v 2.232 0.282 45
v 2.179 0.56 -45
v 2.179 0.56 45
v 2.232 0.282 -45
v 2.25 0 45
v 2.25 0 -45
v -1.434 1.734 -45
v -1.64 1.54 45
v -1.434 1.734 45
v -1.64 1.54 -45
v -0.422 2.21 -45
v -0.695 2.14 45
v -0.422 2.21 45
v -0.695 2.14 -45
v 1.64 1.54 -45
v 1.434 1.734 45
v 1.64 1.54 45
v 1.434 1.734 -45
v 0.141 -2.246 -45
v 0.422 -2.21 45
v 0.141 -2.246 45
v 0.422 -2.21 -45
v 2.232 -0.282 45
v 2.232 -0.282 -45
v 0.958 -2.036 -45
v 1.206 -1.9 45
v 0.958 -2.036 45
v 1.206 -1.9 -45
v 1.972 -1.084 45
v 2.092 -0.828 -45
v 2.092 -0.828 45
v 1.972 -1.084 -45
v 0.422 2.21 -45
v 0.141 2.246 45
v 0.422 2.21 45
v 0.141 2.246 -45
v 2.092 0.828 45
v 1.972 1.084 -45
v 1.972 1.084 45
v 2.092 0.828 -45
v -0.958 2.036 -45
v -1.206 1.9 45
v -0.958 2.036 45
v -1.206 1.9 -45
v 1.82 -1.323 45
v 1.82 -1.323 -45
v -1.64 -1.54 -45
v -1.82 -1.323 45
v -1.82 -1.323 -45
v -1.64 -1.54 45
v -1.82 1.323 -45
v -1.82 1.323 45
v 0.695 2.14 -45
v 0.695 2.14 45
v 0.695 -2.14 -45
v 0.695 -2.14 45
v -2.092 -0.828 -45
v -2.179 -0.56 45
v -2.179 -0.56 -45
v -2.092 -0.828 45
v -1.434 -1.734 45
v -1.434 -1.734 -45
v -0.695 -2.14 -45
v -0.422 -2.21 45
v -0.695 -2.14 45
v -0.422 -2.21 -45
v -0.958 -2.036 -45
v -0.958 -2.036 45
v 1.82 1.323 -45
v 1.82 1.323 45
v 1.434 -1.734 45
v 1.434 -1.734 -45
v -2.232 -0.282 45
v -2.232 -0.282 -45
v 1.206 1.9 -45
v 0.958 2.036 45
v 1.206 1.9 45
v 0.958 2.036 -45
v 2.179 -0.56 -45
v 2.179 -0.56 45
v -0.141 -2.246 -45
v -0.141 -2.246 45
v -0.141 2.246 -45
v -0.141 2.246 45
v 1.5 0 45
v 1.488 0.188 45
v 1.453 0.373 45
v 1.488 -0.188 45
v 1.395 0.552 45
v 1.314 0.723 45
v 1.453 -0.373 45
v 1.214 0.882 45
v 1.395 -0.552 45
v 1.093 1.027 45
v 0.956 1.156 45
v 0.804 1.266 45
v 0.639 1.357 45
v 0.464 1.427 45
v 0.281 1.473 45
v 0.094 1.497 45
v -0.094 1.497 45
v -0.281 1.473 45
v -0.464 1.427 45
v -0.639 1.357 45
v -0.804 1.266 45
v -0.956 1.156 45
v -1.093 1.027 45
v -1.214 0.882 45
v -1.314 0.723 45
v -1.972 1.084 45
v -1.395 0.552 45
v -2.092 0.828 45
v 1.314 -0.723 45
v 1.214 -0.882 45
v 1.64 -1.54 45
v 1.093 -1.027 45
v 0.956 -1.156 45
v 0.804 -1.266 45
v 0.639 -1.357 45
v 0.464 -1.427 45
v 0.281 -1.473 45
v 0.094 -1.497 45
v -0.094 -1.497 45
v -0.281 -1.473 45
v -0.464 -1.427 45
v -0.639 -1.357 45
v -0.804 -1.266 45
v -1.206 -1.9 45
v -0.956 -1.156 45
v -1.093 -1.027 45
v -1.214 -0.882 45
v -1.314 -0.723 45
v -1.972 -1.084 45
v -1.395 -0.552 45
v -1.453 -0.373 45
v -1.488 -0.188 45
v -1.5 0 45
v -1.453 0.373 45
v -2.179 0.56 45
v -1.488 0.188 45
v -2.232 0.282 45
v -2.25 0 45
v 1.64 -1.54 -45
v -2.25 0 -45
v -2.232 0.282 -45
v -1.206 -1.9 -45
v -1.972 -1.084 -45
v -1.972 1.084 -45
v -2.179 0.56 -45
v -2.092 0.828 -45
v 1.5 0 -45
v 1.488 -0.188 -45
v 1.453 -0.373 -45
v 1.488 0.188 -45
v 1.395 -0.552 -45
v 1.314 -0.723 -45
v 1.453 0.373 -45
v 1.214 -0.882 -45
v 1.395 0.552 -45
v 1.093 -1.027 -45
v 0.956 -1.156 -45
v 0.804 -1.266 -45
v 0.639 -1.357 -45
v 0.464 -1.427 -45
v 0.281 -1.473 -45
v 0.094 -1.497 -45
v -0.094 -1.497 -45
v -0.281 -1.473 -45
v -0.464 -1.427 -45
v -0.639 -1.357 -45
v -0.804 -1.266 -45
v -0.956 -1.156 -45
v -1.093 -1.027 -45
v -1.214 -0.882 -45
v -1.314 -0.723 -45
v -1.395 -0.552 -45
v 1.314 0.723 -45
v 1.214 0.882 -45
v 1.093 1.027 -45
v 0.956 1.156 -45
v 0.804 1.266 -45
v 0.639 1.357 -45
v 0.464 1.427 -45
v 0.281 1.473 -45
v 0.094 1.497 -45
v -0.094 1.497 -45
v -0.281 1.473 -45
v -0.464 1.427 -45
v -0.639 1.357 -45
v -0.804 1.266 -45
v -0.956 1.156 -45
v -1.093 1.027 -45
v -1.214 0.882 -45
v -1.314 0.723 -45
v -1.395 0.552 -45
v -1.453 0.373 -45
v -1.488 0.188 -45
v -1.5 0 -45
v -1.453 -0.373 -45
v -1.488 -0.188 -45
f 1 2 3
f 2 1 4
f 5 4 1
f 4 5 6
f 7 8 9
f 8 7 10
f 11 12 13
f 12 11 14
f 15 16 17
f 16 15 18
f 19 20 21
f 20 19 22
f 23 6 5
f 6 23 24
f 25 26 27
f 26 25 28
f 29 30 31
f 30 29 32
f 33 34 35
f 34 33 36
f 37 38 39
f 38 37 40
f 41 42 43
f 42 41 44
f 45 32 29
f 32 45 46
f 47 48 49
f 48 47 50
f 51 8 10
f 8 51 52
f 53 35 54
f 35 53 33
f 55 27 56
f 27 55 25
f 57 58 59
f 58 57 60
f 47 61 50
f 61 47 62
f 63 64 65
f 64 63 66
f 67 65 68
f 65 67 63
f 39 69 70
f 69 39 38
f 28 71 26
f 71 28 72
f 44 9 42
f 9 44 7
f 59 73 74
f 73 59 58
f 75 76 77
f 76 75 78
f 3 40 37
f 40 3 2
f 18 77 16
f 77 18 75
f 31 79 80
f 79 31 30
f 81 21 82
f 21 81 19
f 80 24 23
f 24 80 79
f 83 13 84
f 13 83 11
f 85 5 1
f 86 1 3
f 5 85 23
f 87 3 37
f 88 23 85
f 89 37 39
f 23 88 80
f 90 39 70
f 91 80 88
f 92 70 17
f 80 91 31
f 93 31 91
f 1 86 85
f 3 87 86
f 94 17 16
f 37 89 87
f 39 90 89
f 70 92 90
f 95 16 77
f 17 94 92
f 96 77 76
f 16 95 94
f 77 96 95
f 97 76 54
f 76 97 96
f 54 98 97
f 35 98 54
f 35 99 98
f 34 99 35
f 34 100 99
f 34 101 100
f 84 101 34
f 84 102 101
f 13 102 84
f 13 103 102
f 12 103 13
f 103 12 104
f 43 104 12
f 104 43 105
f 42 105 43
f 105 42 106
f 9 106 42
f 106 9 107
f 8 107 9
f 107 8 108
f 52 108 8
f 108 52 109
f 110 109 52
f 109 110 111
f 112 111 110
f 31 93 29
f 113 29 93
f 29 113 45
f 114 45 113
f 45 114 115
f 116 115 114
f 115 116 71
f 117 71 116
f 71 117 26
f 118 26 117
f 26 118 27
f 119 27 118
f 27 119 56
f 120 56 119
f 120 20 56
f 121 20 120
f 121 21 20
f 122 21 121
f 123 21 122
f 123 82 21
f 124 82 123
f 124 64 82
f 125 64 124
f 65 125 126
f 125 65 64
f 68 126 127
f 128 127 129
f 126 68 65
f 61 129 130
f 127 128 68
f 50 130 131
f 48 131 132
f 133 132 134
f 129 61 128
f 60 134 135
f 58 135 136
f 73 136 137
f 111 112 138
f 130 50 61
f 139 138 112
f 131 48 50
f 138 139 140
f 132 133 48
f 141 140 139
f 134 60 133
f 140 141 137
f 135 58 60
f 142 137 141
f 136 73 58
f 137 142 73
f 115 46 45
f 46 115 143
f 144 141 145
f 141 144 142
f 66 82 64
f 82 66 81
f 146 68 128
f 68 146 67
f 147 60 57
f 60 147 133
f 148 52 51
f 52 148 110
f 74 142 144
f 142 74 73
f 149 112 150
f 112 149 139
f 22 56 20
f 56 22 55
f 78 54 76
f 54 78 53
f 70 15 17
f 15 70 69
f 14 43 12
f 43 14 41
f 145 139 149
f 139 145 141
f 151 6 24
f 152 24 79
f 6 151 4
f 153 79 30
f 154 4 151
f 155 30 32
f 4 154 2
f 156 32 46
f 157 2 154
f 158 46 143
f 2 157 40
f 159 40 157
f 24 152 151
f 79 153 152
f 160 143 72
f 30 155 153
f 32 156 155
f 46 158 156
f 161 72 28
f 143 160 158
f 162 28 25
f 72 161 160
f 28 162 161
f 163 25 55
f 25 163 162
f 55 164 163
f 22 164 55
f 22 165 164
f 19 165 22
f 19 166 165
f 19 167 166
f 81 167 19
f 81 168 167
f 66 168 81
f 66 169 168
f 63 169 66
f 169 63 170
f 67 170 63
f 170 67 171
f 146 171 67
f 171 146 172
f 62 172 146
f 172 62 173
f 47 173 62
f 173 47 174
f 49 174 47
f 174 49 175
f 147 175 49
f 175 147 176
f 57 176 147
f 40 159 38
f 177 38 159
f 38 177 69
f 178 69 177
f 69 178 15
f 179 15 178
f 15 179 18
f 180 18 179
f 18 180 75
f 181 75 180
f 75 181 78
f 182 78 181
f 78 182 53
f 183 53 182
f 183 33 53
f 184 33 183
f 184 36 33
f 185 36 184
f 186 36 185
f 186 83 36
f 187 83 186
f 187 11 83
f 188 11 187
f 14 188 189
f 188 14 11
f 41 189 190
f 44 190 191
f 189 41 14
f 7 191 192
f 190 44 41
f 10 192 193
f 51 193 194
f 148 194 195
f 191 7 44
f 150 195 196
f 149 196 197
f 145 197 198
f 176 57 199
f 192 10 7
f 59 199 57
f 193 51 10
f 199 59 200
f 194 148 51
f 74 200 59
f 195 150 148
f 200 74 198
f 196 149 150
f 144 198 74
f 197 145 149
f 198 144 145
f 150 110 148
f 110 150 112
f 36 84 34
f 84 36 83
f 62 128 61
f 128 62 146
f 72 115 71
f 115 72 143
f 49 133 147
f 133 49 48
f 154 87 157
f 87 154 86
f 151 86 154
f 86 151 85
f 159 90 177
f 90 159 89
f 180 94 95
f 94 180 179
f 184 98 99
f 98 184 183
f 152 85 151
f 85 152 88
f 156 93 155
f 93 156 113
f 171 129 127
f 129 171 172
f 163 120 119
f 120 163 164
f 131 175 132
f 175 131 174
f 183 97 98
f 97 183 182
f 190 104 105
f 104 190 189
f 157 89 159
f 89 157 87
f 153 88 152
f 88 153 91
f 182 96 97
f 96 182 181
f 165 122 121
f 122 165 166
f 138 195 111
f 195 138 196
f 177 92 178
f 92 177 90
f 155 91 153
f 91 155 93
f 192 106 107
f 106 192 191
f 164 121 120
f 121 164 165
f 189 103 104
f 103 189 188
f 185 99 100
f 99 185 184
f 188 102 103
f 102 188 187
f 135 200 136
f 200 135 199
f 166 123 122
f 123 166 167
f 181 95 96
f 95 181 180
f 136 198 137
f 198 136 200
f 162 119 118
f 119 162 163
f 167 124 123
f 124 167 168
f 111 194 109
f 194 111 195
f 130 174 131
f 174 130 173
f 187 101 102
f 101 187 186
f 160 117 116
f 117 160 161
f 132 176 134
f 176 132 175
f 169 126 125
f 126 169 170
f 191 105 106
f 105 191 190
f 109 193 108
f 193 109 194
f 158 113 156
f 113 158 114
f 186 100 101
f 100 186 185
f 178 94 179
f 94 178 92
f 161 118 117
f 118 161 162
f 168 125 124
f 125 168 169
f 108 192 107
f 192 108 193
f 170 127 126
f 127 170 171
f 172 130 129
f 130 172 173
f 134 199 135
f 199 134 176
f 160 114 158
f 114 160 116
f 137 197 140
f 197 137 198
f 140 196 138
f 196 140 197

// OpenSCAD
$fn = 50;


difference() {
	union() {
		translate(v = [0, 0, -45.0000000000]) {
			cylinder(h = 90, r = 2.2500000000);
		}
	}
	union() {
		translate(v = [0, 0, -100.0000000000]) {
			cylinder(h = 200, r = 1.5000000000);
		}
	}
}
